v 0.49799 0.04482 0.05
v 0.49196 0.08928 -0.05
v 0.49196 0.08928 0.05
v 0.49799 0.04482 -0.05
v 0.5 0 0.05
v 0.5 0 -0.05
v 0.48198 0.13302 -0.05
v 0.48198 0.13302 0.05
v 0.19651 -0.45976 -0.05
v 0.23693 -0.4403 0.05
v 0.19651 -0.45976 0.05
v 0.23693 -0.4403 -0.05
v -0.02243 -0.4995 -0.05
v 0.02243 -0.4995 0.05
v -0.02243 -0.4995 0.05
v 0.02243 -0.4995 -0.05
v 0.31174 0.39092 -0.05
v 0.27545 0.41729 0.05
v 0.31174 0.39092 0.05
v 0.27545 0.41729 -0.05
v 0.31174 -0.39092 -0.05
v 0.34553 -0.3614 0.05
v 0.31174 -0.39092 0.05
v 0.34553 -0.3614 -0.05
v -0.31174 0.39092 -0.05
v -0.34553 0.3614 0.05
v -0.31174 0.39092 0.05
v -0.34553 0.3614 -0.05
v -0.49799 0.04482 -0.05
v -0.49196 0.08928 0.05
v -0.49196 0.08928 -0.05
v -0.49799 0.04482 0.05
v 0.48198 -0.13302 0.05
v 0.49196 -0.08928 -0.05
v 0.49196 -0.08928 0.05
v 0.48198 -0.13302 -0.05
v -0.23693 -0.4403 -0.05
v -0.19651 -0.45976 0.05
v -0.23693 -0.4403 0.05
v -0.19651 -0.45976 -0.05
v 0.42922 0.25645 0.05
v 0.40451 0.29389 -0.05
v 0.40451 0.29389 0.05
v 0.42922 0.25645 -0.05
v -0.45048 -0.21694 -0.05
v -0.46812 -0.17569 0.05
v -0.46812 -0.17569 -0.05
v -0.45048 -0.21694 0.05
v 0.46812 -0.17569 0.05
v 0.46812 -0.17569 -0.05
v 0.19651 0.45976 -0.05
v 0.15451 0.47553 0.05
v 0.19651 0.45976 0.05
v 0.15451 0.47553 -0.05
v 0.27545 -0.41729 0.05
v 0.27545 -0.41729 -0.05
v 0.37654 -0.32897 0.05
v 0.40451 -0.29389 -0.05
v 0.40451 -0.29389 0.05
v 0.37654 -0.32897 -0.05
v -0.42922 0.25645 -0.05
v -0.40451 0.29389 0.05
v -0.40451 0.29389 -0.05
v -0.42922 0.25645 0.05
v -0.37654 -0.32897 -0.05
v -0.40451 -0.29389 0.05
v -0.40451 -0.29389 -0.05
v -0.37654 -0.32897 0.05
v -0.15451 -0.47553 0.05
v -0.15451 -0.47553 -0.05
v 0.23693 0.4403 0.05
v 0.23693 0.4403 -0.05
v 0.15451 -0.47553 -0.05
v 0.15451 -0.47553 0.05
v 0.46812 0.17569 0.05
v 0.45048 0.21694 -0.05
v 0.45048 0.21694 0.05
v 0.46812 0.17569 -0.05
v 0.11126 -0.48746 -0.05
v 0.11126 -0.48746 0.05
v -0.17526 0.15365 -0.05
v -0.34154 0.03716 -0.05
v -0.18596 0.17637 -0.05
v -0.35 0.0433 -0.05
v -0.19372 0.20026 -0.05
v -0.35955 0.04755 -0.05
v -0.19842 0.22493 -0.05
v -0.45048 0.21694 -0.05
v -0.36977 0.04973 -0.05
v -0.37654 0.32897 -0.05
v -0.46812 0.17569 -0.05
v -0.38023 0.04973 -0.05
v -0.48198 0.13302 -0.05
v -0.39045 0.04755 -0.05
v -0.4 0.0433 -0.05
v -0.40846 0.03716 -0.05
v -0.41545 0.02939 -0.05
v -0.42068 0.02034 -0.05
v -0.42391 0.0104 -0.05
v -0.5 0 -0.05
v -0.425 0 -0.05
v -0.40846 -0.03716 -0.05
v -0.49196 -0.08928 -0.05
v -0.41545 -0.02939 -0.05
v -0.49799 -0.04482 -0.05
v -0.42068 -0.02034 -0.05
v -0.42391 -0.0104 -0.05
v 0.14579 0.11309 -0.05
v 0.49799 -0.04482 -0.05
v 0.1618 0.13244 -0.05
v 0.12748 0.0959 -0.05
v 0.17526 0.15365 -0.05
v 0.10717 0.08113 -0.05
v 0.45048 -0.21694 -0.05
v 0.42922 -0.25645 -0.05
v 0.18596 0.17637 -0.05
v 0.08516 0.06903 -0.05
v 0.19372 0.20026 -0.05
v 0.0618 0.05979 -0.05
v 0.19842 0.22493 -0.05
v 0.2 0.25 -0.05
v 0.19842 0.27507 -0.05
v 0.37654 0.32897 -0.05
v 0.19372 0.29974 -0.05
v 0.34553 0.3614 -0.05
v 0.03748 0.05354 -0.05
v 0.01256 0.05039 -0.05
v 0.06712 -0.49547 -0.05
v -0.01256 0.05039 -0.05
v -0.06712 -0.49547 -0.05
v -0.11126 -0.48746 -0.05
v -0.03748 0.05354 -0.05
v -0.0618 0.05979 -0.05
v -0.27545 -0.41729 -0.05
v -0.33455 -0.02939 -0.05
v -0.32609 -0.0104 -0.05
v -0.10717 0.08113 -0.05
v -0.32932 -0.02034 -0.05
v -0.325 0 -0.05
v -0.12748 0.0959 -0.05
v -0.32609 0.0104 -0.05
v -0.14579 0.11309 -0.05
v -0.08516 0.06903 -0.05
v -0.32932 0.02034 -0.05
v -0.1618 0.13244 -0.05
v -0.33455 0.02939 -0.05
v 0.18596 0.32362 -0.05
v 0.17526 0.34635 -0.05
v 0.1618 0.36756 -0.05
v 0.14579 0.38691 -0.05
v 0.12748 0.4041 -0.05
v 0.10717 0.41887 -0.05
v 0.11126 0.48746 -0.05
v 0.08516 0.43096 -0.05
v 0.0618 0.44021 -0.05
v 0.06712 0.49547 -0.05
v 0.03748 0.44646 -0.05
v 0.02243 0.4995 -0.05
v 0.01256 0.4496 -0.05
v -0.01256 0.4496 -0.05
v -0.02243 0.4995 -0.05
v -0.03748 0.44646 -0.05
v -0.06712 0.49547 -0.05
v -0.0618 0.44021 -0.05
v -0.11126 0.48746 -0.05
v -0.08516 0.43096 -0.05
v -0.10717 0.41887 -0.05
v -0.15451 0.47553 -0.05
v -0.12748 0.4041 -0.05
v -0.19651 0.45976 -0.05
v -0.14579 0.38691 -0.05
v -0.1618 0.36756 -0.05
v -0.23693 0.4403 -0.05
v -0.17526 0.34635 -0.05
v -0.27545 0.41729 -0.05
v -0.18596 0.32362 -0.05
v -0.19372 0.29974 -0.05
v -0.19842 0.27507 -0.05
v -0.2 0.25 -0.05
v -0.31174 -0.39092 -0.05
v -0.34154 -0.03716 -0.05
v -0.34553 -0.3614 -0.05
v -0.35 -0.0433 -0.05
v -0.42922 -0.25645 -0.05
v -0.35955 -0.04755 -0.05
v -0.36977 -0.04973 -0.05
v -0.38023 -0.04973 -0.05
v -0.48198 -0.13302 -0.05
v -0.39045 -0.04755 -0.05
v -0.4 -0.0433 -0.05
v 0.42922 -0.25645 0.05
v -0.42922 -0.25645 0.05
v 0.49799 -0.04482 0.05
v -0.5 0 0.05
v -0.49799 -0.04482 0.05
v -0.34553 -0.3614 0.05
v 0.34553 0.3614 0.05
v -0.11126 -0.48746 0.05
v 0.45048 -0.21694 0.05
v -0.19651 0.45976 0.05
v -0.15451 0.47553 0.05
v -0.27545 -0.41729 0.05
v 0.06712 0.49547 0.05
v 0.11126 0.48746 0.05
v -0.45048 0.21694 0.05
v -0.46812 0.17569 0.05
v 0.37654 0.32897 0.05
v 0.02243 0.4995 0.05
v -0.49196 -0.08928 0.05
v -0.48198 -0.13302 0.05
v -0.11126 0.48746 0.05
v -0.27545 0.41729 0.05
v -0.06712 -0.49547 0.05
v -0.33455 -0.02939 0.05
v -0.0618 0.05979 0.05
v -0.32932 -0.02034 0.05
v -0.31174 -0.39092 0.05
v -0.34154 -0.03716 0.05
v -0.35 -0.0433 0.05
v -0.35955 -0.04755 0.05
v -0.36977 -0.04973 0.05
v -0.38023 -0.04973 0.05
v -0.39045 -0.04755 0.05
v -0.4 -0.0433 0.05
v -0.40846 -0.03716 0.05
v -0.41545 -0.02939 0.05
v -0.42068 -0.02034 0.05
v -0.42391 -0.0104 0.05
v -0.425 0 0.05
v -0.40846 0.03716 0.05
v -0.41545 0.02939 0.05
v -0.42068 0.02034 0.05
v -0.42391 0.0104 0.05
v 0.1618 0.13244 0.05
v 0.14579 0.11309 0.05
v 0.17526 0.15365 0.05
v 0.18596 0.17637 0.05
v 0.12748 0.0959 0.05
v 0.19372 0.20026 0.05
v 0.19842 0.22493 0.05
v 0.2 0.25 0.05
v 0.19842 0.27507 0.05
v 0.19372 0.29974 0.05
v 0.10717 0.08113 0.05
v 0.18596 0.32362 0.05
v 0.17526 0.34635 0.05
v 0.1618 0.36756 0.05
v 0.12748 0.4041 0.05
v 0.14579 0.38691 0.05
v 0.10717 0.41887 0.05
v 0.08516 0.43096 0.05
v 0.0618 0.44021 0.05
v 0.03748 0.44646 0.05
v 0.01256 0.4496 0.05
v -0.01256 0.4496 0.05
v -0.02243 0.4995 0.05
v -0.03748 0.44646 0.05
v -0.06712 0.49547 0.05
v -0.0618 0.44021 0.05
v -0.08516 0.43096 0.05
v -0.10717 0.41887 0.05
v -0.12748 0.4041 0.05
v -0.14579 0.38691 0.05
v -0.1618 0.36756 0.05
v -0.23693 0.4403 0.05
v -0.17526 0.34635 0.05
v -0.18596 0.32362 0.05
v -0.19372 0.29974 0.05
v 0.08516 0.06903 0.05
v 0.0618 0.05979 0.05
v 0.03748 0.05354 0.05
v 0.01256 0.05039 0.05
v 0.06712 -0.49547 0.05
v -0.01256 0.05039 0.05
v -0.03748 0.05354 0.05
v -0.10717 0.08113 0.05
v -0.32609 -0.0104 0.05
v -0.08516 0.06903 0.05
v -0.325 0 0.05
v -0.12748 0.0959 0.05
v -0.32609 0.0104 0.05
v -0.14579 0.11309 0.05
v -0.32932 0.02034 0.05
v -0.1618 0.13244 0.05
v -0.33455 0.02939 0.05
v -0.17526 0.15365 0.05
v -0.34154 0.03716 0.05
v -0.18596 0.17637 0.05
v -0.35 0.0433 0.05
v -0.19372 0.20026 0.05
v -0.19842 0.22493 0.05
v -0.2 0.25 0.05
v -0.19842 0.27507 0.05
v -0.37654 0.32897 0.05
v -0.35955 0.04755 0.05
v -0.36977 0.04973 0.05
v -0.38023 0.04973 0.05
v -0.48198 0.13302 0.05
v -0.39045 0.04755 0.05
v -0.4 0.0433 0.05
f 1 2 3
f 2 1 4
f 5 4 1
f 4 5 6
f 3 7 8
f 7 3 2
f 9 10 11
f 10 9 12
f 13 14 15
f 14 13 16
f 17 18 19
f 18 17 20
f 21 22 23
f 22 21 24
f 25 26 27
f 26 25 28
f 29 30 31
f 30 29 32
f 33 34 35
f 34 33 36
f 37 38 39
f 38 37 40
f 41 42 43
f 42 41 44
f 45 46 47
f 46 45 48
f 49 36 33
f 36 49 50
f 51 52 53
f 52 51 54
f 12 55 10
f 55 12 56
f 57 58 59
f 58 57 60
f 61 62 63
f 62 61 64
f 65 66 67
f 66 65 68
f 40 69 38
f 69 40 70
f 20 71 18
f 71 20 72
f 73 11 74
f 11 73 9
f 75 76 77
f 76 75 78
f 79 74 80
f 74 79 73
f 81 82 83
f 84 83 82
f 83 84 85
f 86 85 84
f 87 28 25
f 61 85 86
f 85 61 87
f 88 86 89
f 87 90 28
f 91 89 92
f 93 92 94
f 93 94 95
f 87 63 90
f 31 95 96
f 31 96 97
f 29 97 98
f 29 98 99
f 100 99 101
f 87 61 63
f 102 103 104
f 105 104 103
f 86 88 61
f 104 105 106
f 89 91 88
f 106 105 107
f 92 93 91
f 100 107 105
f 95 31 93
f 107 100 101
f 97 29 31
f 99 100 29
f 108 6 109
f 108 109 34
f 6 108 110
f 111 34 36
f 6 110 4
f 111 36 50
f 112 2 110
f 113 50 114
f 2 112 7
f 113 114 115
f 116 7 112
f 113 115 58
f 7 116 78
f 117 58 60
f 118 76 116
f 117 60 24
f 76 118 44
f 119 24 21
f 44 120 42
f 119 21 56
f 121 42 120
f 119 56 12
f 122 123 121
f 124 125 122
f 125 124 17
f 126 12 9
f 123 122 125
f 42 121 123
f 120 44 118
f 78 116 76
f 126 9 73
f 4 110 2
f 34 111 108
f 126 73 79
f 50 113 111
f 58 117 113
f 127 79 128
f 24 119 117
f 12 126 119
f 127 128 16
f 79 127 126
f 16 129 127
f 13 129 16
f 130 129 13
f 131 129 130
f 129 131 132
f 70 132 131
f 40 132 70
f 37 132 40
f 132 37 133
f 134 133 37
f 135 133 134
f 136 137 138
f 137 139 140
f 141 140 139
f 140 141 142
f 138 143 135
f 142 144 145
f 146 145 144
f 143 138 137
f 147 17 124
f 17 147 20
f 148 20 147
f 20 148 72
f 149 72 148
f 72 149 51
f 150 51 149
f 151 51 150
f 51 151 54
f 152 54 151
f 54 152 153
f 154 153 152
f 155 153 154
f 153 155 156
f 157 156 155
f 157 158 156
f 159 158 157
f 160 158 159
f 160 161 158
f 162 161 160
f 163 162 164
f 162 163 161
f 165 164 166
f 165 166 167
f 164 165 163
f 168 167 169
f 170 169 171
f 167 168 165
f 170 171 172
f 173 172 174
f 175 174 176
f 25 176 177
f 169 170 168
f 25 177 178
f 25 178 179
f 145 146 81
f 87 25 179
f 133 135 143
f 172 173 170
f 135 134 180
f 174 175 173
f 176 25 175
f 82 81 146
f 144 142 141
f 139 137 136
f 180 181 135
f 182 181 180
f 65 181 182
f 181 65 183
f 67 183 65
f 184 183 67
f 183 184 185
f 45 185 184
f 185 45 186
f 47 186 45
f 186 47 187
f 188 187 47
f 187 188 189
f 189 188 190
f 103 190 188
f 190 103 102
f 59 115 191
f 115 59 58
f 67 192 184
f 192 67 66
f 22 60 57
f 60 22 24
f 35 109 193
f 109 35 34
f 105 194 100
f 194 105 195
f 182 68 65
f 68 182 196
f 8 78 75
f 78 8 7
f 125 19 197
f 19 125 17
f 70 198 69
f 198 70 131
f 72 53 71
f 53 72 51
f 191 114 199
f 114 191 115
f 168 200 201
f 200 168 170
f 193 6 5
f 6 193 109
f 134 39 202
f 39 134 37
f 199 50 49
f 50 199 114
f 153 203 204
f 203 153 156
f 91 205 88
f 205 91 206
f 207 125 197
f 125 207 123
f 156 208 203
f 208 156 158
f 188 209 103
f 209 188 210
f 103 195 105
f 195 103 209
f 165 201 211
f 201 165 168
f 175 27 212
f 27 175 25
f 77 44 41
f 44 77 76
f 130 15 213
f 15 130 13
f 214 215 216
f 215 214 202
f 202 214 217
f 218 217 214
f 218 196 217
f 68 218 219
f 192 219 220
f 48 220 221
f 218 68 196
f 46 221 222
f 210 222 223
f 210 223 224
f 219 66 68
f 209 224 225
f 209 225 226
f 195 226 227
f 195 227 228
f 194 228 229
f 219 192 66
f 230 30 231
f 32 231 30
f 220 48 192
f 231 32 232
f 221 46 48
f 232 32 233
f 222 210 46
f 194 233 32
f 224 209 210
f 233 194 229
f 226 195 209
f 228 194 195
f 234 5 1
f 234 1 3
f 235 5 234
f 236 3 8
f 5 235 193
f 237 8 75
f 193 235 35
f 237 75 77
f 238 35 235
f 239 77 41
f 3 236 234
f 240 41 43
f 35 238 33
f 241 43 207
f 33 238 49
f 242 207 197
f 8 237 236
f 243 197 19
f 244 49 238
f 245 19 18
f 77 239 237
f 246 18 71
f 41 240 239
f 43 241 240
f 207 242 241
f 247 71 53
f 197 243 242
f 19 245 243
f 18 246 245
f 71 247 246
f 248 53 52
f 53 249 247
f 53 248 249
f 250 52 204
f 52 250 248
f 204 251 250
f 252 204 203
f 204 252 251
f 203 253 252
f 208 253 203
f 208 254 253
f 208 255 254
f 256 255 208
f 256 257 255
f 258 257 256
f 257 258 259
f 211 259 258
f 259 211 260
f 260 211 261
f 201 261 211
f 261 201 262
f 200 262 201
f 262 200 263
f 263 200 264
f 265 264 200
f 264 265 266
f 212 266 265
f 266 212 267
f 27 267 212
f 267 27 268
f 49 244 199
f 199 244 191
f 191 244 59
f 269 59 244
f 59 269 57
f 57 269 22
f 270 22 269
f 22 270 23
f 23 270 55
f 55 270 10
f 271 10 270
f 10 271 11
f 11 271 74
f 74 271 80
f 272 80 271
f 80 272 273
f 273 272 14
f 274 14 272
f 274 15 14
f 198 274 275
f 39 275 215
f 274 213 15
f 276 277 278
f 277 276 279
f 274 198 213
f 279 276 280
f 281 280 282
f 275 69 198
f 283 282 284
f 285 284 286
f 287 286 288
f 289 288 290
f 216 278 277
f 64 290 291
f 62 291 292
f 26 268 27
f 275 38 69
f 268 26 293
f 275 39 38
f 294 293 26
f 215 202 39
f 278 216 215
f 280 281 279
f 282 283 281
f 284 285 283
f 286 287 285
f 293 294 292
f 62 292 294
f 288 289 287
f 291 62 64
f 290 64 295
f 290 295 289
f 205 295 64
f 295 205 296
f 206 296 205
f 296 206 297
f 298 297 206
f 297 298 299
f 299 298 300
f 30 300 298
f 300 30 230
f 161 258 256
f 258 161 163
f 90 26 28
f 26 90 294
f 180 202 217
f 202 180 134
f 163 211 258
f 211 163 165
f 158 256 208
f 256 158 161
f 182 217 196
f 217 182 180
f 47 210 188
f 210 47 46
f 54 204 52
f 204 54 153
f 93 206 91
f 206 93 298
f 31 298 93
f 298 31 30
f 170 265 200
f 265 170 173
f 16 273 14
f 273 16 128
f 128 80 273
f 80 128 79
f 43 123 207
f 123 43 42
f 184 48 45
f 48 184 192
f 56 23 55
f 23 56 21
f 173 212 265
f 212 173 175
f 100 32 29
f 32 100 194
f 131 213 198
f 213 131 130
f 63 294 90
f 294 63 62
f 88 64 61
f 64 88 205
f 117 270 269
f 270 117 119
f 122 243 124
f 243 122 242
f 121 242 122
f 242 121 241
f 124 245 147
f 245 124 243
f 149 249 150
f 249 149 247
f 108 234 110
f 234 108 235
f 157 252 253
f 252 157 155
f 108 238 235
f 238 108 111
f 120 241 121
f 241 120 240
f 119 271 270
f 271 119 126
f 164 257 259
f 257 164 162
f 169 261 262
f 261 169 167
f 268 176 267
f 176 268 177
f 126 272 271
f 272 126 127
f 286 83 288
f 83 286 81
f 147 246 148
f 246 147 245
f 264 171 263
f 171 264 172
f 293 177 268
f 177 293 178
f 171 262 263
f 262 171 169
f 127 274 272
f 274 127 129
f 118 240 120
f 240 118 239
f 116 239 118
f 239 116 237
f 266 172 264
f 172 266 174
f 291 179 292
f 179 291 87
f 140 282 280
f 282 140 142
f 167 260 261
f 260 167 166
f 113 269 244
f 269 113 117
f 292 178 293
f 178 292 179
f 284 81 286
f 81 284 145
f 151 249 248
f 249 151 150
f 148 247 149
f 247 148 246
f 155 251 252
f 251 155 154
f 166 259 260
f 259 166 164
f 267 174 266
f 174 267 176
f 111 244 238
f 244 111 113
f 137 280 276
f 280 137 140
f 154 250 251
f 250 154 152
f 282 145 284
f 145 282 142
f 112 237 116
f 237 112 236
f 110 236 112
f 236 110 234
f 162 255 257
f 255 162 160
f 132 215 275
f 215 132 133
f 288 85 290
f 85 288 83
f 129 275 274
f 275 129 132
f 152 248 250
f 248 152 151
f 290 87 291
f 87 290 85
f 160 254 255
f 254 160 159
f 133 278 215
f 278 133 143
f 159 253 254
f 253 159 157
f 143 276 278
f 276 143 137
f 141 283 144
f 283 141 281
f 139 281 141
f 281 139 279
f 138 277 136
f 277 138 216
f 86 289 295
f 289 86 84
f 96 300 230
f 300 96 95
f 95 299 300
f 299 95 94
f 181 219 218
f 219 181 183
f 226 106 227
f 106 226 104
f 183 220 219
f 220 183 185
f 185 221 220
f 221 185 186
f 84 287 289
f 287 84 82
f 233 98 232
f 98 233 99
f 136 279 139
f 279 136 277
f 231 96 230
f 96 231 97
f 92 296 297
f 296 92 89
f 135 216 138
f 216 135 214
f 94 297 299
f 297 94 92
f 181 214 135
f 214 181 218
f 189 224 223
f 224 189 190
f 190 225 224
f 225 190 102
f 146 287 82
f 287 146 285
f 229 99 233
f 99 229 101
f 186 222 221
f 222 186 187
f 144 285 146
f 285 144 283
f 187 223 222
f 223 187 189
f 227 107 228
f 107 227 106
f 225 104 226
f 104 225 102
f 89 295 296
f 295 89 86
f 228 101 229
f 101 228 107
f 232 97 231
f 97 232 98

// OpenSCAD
scale(0.5) difference() {
    cylinder(h=0.2,r=1,center=true,$fn=70);
    translate([0,0.5,0])
        cylinder(h=1,r=0.4,center=true,$fn=50);
    translate([-0.75,0,0])
        cylinder(h=1,r=0.1,center=true,$fn=30);
}
